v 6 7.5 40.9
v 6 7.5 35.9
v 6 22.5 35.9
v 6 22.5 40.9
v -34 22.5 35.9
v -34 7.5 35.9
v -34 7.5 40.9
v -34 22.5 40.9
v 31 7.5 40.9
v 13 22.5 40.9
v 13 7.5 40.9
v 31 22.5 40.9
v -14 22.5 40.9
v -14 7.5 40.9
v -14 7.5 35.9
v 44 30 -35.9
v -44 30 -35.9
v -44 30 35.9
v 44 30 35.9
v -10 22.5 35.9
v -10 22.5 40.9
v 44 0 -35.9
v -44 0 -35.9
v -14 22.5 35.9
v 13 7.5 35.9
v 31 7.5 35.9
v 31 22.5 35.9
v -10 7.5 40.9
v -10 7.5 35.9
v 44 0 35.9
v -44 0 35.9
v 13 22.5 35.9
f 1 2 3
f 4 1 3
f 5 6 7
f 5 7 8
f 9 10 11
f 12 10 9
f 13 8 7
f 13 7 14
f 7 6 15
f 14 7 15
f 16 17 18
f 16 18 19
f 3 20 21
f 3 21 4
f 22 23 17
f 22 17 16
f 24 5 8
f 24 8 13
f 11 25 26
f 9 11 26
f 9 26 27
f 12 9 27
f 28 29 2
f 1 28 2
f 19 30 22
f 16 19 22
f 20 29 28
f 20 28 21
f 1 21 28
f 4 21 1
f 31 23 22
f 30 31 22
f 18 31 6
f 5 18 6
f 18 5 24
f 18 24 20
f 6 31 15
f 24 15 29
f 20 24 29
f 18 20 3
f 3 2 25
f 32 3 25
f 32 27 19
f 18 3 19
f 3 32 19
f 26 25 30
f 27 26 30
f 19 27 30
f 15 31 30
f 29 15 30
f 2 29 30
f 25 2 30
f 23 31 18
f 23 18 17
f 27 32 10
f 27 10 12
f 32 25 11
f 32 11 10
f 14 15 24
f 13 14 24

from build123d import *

# Parameters (mm, degrees)
SKETCH1_W           = 88
SKETCH1_H           = 71.8
BOSS_EXTRUDE1_DEPTH = 30
SKETCH2_W           = 20
SKETCH2_H           = 15
SKETCH2_W_2         = 16
SKETCH2_W_3         = 18
BOSS_EXTRUDE2_DEPTH = 5


with BuildPart() as part:
    # Sketch1 → Boss-Extrude1 (new body)
    with BuildSketch(Plane(origin=(0, 0, 0), x_dir=(1, 0, 0), z_dir=(0, 1, 0))):
        Rectangle(SKETCH1_W, SKETCH1_H)
    extrude(amount=BOSS_EXTRUDE1_DEPTH)

    # Sketch2 → Boss-Extrude2 (add)
    with BuildSketch(Plane.XY.offset(35.9)):
        with Locations((-24, 15)):
            Rectangle(SKETCH2_W, SKETCH2_H)
        with Locations((-2, 15)):
            Rectangle(SKETCH2_W_2, SKETCH2_H)
        with Locations((22, 15)):
            Rectangle(SKETCH2_W_3, SKETCH2_H)
    extrude(amount=BOSS_EXTRUDE2_DEPTH)


solid = part.part
